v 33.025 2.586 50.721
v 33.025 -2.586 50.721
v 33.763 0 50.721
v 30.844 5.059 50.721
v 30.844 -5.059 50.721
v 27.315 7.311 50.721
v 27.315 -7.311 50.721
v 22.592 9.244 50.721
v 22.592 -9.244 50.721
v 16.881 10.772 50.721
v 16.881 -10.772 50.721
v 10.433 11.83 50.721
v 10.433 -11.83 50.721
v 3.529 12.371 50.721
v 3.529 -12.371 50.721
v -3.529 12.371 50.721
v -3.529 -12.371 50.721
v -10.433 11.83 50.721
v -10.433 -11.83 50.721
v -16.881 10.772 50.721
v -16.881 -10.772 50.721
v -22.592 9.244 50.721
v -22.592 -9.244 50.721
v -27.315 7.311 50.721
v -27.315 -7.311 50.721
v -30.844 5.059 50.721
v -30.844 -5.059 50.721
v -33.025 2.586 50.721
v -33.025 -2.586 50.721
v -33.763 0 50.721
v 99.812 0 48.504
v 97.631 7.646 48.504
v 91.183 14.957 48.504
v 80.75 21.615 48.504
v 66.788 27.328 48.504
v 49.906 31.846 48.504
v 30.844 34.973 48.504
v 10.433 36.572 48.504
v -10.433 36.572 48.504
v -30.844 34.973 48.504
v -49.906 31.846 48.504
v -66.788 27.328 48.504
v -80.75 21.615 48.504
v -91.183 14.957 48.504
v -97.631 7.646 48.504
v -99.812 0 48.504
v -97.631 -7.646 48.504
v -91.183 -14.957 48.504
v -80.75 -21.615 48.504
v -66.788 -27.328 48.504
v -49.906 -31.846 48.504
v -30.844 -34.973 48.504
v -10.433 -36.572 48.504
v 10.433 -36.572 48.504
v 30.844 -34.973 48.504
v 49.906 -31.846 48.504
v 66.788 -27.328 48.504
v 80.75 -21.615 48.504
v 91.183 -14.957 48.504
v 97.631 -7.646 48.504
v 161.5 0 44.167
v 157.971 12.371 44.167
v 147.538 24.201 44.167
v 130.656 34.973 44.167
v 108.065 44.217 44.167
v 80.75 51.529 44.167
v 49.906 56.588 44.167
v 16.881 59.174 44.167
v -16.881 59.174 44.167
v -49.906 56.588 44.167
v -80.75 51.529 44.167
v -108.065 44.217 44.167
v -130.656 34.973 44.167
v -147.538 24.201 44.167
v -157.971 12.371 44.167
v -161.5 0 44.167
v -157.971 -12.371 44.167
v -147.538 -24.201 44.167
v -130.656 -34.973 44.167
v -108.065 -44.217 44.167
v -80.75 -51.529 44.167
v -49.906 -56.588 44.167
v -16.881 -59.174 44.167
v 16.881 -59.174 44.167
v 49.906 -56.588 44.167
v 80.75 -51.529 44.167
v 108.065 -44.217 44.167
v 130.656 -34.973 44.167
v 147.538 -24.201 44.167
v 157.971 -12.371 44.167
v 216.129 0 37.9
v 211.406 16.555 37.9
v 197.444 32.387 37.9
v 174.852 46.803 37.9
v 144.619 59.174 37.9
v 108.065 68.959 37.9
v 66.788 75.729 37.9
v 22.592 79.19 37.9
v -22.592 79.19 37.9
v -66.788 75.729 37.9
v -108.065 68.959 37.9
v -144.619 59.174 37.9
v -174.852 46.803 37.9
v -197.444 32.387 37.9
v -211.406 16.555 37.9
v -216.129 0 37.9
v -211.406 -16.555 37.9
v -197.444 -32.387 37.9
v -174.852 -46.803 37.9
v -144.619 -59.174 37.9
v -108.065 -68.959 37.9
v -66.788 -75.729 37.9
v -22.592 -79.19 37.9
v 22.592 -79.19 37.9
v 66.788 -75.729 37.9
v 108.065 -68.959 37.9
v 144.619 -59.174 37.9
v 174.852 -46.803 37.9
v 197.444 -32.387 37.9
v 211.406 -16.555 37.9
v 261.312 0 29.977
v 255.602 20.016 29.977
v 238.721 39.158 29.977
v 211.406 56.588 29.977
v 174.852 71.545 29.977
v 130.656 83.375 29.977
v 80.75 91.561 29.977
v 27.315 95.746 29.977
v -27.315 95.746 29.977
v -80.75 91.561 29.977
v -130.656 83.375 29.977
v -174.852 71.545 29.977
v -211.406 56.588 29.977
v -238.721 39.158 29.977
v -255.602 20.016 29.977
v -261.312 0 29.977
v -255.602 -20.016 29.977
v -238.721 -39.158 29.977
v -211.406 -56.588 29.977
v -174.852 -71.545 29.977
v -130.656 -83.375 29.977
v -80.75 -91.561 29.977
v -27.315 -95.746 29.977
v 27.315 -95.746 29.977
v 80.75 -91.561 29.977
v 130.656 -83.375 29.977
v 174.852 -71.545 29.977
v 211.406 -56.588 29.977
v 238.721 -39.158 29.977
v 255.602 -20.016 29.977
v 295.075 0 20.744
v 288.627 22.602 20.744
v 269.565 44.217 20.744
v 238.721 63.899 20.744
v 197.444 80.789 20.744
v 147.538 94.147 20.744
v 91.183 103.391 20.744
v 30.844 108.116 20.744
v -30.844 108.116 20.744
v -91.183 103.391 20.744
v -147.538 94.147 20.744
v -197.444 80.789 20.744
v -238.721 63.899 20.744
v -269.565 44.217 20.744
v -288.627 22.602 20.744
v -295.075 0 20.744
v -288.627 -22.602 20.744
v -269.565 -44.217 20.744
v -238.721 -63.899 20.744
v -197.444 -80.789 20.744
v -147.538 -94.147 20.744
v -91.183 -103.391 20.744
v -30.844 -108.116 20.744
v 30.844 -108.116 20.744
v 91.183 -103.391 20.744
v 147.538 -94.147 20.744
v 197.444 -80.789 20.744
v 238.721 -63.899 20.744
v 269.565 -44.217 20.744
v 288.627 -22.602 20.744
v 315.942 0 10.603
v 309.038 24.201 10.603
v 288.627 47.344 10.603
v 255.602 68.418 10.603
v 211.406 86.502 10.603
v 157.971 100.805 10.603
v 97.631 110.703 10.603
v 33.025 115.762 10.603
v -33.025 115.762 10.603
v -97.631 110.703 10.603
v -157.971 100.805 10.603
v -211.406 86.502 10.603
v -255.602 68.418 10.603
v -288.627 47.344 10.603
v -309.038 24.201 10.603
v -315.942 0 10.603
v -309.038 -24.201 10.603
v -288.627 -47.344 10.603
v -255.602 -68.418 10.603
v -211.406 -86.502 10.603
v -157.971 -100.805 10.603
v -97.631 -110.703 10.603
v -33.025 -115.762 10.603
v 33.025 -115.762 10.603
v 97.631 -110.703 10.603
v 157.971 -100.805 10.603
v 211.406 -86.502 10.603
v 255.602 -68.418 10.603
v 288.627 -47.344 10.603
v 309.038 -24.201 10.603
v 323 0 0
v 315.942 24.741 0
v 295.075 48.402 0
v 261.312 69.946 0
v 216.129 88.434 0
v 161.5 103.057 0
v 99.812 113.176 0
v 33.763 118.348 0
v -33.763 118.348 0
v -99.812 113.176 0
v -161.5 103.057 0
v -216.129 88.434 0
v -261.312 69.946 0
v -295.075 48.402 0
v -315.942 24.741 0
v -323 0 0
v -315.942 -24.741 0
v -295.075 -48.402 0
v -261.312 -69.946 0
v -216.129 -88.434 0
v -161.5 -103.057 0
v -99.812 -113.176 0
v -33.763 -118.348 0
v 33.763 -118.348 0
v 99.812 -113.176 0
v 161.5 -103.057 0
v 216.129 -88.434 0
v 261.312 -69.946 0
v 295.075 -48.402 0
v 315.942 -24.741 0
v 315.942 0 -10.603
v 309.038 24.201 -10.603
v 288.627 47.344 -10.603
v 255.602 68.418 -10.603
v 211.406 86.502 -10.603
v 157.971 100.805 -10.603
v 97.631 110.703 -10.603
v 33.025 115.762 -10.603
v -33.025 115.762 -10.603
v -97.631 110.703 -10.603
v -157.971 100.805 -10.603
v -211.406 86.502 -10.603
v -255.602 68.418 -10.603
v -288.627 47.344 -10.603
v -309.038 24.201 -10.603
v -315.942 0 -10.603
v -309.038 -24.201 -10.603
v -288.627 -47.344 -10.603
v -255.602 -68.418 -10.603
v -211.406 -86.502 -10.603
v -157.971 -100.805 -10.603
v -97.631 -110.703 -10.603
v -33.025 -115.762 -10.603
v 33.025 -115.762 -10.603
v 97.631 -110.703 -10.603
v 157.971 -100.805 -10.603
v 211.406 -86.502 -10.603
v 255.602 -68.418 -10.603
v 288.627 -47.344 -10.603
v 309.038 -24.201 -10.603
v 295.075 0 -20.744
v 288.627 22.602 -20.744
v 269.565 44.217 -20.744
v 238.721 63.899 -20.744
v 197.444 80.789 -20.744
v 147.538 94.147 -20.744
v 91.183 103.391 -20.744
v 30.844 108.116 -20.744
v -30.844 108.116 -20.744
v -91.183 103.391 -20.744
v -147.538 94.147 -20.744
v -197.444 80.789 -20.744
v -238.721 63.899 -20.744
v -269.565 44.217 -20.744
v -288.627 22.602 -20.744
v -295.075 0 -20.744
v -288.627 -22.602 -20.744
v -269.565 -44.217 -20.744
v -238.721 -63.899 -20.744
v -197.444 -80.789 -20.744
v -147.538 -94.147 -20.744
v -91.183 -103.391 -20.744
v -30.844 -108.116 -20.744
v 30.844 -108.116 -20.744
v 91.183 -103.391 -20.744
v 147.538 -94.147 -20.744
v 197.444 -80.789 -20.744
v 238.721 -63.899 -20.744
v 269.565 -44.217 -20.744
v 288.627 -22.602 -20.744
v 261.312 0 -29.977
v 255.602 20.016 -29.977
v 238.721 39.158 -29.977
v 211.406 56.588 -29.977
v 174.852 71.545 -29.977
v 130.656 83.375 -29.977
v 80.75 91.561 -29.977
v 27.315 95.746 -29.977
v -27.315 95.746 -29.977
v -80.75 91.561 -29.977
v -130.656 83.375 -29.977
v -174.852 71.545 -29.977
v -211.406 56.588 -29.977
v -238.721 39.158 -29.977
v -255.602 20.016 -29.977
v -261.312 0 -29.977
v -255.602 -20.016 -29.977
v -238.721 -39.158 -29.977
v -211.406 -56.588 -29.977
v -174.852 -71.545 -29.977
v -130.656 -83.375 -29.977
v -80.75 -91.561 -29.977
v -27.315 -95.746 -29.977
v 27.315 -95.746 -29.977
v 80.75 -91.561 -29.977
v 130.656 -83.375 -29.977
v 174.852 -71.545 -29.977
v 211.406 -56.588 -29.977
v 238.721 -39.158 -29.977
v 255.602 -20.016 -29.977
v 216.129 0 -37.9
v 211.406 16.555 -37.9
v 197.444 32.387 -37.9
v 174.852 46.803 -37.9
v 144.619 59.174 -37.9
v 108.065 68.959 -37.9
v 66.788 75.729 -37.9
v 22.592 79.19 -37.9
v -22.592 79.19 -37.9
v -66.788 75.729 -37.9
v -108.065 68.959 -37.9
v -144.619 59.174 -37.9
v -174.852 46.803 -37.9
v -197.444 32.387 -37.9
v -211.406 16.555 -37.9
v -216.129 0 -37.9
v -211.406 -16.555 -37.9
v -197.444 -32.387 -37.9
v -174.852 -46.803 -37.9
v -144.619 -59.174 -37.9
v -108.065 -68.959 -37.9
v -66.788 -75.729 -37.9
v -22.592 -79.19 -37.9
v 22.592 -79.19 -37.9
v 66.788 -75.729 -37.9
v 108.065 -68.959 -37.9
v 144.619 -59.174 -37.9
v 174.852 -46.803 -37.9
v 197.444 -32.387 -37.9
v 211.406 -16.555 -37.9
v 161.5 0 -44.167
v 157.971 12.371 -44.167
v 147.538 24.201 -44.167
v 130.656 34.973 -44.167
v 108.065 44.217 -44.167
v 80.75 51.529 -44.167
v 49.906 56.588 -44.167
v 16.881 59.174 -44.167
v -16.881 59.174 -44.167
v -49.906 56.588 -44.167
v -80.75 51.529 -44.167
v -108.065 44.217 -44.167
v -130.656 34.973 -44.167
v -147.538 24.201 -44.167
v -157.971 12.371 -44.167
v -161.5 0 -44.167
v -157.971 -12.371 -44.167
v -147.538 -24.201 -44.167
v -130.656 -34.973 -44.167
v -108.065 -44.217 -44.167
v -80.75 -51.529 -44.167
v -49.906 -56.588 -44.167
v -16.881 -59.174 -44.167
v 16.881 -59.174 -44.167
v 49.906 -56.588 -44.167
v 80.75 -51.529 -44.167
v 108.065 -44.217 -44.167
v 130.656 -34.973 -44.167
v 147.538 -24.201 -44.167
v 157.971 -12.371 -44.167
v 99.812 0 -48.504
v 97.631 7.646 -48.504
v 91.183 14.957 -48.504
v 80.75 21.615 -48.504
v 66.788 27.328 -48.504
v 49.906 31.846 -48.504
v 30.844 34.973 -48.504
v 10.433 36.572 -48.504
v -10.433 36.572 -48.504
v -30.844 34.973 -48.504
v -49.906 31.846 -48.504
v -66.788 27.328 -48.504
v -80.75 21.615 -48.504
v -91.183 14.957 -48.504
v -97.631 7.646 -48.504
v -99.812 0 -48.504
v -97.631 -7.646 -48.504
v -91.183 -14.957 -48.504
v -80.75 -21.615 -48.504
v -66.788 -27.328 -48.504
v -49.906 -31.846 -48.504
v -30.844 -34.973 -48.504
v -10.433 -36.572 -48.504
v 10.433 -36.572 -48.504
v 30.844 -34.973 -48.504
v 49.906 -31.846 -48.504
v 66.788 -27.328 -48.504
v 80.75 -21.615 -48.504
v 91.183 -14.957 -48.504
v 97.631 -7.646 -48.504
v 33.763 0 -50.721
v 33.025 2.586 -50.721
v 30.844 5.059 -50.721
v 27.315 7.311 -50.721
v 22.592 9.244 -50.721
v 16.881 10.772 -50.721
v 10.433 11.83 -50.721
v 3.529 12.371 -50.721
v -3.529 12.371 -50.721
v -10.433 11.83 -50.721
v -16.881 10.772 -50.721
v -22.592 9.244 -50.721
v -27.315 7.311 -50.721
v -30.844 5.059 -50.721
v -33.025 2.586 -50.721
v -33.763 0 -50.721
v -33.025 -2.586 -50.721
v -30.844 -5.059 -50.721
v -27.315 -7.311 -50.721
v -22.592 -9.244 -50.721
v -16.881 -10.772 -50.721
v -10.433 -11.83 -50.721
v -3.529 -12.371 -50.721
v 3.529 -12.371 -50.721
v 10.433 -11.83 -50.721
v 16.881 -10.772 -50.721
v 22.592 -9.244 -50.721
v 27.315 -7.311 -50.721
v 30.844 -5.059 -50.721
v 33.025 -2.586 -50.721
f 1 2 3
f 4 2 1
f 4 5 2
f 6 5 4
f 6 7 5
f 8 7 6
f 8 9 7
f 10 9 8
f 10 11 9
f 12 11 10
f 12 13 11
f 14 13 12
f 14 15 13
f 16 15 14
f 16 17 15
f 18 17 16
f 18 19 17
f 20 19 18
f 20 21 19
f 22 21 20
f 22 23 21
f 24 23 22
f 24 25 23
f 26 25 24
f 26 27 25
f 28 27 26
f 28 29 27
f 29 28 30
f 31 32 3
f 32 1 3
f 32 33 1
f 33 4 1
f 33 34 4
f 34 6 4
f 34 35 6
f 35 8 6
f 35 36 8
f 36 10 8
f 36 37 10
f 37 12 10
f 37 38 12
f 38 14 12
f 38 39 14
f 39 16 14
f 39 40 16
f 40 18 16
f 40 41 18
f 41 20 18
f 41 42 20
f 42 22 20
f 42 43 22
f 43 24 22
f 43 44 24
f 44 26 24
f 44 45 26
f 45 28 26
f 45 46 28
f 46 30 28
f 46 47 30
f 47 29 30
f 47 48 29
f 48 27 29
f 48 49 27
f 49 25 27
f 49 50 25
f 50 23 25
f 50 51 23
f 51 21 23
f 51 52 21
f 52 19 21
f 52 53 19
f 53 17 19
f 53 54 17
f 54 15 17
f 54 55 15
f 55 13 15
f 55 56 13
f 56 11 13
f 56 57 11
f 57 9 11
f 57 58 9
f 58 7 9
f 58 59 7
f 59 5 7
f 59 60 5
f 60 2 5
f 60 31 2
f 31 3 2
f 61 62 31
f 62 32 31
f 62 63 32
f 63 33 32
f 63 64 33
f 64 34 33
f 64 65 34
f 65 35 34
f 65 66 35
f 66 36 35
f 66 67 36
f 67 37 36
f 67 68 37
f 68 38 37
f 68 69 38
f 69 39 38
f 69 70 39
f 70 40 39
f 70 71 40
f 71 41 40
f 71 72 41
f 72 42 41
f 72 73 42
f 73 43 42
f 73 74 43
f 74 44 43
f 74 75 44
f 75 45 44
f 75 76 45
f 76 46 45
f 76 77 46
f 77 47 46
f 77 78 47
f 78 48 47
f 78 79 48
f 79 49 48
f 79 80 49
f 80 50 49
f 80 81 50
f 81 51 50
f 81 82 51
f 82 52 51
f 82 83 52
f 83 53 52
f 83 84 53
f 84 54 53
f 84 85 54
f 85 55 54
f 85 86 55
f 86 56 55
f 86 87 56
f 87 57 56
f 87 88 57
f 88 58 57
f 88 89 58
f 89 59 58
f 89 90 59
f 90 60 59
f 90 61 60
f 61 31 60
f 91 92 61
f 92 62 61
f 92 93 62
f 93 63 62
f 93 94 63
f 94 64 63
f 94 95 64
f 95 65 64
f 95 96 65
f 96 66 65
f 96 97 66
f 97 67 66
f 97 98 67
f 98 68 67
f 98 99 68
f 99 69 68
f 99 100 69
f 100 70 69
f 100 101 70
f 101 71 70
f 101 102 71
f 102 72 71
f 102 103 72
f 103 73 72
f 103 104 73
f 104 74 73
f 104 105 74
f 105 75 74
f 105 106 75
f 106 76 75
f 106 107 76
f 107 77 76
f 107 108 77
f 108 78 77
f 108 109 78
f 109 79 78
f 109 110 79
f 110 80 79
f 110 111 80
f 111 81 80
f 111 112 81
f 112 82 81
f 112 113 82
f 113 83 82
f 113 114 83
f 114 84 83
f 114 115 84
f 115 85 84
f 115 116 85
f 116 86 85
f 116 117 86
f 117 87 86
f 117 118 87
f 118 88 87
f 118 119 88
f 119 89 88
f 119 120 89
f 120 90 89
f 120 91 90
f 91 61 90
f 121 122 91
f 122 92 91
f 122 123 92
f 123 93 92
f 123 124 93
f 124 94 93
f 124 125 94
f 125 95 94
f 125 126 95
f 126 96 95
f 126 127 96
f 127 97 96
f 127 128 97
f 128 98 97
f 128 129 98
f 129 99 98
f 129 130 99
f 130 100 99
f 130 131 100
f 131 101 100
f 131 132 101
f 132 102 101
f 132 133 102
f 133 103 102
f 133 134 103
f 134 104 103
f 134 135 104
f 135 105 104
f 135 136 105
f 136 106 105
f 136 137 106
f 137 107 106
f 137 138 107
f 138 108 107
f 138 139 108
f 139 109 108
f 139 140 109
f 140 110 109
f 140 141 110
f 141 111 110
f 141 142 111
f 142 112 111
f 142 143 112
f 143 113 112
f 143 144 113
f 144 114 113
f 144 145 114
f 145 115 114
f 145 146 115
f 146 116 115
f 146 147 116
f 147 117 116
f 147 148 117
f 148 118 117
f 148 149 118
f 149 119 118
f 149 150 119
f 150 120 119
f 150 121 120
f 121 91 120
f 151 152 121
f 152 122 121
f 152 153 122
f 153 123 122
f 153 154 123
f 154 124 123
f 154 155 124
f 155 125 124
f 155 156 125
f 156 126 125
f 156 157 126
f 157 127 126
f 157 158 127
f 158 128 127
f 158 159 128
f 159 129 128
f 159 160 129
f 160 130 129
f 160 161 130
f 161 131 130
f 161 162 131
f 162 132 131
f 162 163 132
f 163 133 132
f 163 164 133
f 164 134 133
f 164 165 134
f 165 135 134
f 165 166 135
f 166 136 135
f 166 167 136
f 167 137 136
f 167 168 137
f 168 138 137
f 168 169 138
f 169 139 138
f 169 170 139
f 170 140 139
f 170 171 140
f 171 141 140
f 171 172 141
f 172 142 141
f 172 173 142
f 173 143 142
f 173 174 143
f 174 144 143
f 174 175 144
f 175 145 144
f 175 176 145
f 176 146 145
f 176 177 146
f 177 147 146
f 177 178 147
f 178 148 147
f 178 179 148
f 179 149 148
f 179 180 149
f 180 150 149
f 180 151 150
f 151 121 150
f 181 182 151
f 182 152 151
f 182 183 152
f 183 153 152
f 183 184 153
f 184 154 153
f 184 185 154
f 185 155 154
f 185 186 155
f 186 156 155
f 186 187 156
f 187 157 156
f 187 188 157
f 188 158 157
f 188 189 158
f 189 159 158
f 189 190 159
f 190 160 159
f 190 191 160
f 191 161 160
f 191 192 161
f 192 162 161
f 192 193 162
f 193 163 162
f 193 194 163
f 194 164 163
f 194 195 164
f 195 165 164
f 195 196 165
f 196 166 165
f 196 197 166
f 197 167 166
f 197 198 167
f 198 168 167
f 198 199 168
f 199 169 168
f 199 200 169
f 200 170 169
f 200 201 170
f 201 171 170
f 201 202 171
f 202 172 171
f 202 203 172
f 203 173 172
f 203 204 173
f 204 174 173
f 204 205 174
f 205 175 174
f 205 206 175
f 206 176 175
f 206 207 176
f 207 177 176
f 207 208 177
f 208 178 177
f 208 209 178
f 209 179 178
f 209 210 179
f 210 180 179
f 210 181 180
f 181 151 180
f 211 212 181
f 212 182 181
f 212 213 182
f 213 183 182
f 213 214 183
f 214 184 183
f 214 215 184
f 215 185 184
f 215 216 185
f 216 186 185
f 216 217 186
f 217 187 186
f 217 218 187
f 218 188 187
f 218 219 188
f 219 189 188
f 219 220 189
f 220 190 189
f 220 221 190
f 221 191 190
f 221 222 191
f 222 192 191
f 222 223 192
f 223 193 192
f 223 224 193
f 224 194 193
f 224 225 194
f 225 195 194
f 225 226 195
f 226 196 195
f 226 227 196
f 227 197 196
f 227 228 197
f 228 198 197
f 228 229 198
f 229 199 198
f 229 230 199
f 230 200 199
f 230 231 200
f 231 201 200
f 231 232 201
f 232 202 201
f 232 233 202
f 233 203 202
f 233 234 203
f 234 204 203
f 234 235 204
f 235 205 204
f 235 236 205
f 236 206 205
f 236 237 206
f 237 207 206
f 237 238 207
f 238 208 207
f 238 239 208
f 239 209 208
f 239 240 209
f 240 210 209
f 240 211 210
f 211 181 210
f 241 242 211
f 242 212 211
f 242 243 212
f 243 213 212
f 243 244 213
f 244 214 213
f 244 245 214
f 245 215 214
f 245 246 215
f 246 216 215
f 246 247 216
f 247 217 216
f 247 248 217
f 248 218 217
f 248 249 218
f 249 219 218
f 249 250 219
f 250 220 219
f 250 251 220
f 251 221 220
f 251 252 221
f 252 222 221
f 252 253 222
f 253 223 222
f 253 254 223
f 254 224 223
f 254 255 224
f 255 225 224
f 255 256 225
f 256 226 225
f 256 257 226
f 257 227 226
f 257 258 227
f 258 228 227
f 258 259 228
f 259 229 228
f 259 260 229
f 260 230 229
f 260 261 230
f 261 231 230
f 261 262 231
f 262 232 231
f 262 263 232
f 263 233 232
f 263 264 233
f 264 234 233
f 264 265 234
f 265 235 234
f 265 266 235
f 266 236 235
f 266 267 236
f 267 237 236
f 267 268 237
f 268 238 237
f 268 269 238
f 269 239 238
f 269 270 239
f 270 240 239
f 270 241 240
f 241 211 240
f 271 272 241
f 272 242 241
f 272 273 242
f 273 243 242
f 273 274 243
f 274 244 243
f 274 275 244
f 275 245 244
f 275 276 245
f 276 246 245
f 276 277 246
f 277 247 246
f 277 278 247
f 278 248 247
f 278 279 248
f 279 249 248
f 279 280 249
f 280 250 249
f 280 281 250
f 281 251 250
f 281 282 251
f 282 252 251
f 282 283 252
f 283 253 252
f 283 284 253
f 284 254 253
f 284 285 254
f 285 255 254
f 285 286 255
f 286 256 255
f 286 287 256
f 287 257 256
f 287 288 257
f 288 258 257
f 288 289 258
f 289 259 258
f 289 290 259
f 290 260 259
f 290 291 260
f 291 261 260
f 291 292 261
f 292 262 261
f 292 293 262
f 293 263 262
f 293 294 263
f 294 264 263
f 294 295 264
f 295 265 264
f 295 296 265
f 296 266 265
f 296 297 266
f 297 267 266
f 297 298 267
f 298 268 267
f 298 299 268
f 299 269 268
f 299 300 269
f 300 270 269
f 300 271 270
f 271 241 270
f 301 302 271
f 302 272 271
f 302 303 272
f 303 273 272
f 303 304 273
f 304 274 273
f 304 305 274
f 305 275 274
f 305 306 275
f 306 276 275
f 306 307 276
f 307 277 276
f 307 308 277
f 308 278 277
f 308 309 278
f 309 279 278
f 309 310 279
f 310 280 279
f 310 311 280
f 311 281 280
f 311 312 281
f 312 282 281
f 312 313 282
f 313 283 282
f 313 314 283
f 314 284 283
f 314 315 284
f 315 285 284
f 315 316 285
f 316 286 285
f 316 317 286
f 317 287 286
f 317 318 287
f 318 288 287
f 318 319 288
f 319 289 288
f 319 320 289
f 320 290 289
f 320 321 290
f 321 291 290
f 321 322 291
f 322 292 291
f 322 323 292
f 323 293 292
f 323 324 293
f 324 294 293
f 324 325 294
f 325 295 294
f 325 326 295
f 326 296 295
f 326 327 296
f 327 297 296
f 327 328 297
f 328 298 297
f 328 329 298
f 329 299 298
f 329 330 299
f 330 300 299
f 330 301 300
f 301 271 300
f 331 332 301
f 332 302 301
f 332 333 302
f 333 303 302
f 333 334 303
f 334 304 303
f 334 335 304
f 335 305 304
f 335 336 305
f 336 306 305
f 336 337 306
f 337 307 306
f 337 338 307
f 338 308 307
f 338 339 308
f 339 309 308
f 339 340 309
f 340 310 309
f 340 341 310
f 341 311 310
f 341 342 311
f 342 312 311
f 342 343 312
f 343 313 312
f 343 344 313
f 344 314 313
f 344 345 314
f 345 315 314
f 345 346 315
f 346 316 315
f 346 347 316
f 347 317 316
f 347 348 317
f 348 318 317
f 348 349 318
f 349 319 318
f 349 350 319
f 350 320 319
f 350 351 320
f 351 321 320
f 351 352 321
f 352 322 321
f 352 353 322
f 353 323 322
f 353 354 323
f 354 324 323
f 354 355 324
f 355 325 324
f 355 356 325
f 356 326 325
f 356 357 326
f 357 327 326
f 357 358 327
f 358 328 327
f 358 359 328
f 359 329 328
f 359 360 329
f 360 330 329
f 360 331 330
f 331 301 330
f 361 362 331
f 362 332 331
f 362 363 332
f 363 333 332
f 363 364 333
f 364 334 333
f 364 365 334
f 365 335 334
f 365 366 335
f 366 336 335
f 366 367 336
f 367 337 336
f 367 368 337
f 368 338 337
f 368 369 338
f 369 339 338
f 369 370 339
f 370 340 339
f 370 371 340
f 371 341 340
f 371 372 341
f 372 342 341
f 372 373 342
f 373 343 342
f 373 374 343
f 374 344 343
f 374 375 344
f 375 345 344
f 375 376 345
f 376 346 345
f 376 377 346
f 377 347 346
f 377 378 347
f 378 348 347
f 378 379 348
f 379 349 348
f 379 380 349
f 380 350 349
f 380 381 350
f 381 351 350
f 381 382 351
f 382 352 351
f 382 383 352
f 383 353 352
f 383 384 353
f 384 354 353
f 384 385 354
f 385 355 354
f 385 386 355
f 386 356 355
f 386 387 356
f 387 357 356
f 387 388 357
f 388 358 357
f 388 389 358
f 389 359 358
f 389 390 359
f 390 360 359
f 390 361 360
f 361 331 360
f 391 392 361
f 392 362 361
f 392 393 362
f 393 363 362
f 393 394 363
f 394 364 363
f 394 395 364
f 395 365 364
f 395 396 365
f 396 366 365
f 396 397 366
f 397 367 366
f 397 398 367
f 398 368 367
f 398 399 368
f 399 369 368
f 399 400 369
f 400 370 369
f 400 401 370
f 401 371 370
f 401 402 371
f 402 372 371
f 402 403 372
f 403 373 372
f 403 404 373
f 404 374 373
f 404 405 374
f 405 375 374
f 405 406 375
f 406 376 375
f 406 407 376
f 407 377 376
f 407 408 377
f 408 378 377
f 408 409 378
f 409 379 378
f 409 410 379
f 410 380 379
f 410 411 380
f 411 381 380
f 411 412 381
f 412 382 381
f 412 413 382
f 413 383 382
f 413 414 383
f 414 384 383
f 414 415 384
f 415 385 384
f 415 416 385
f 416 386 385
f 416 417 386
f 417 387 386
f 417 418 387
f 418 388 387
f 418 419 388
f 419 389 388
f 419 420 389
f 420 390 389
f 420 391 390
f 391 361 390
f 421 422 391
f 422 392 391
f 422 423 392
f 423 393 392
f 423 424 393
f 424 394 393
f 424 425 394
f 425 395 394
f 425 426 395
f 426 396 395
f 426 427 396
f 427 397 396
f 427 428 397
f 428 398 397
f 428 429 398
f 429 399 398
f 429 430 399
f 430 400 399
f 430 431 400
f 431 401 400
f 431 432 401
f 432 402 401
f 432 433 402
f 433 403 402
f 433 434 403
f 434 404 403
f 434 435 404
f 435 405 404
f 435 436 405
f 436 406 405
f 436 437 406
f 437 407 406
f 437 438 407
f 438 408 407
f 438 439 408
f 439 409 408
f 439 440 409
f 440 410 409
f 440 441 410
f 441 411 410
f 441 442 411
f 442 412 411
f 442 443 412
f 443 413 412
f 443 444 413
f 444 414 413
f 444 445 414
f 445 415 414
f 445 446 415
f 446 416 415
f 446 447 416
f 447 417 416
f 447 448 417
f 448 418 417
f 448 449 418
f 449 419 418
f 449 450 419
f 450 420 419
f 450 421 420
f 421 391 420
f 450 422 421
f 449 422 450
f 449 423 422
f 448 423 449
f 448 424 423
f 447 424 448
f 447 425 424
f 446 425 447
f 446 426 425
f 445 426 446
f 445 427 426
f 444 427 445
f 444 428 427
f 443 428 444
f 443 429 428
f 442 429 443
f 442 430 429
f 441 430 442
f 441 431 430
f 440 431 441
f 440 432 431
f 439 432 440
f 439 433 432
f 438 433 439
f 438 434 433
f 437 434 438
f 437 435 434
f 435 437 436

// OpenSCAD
// Generated by SolidPython 1.0.1 on 2020-07-29 00:46:53


scale(v = [19, 7, 3]) {
	sphere(r = 17);
}
/***********************************************
*********      SolidPython code:      **********
************************************************
 
# import packages: SolidPython
from solid import *
from solid.utils import *
from itertools import chain, combinations, permutations


class Resize:

    def __init__(self, scad_file):
        self.scad_file = scad_file
        #self.scad_file = import_scad(scad_file)
        # cone/cylinder param:
        self.r1 = 0
        self.r2 = 0
        self.h = 0
        # rectangular prism param:
        self.w = 0
        self.l = 0
        # ellipse param:
        self.r = 0

    # import OpenScad code (file name corresponds to shape)


    # classify shape + parameters
    def assign(self, param1, param2, param3):
        if self.scad_file == 'cone.scad':
            self.r1 = param1
            self.r2 = param2
            self.h = param3
        elif self.scad_file == 'cylinder.scad':
            self.r1 = param1
            self.r2 = param2
            self.h = param3
        elif self.scad_file == 'rectangularPrism.scad':
            self.h = param1
            self.l = param2
            self.w = param3
        else:
            self.r = param1
            self.h = param2

    # resize parameters
    def iterate(self):
        x = range(3, 20, 2)
        i = 1
        if self.scad_file == 'cone.scad':
            tempList = list(permutations(x, 2))
            for temp in tempList:
                param1 = temp[0]
                param2 = temp[1]
                filepath = 'produced_scad_files/' + 'cone' + str(param1) + '_' + str(param2) + '_' + '.scad'
                scad_render_to_file(cylinder(h=param1, r1=param2, r2=0), filepath)

        elif self.scad_file == 'cylinder.scad':
            tempList = list(permutations(x, 3))
            for temp in tempList:
                param1 = temp[0]
                param2 = temp[1]
                filepath = 'produced_scad_files/' + 'cylinder' + str(param1) + '_' + str(param2) + '_' + '.scad'
                scad_render_to_file(cylinder(h=param1, r1=param2, r2=param2), filepath)

        elif self.scad_file == 'rectangularPrism.scad':
            tempList = list(permutations(x, 3))
            for temp in tempList:
                param1 = temp[0]
                param2 = temp[1]
                param3 = temp[2]
                filepath = 'produced_scad_files/' + 'rectangularPrism' + str(param1) + '_' + str(param2) + '_' + str(
                    param3) + '.scad'
                scad_render_to_file(cube(size=(param1, param2, param3)), filepath)

        elif self.scad_file == 'ellipse.scad':
            tempList = list(permutations(x, 4))
            for temp in tempList:
                param1 = temp[0]
                param2 = temp[1]
                param3 = temp[2]
                param4 = temp[3]
                filepath = 'produced_scad_files/' + 'ellipse' + str(param1) + '_' + str(param2) + '_' + str(param3) + '_' + str(param4) + '.scad'
                scad_render_to_file(scale([param1, param2, param3])(sphere(r=param4)), filepath)

    def render_to_scadfile(self):
        scad_render_to_file(scad, 'example.scad') 
 
************************************************/
